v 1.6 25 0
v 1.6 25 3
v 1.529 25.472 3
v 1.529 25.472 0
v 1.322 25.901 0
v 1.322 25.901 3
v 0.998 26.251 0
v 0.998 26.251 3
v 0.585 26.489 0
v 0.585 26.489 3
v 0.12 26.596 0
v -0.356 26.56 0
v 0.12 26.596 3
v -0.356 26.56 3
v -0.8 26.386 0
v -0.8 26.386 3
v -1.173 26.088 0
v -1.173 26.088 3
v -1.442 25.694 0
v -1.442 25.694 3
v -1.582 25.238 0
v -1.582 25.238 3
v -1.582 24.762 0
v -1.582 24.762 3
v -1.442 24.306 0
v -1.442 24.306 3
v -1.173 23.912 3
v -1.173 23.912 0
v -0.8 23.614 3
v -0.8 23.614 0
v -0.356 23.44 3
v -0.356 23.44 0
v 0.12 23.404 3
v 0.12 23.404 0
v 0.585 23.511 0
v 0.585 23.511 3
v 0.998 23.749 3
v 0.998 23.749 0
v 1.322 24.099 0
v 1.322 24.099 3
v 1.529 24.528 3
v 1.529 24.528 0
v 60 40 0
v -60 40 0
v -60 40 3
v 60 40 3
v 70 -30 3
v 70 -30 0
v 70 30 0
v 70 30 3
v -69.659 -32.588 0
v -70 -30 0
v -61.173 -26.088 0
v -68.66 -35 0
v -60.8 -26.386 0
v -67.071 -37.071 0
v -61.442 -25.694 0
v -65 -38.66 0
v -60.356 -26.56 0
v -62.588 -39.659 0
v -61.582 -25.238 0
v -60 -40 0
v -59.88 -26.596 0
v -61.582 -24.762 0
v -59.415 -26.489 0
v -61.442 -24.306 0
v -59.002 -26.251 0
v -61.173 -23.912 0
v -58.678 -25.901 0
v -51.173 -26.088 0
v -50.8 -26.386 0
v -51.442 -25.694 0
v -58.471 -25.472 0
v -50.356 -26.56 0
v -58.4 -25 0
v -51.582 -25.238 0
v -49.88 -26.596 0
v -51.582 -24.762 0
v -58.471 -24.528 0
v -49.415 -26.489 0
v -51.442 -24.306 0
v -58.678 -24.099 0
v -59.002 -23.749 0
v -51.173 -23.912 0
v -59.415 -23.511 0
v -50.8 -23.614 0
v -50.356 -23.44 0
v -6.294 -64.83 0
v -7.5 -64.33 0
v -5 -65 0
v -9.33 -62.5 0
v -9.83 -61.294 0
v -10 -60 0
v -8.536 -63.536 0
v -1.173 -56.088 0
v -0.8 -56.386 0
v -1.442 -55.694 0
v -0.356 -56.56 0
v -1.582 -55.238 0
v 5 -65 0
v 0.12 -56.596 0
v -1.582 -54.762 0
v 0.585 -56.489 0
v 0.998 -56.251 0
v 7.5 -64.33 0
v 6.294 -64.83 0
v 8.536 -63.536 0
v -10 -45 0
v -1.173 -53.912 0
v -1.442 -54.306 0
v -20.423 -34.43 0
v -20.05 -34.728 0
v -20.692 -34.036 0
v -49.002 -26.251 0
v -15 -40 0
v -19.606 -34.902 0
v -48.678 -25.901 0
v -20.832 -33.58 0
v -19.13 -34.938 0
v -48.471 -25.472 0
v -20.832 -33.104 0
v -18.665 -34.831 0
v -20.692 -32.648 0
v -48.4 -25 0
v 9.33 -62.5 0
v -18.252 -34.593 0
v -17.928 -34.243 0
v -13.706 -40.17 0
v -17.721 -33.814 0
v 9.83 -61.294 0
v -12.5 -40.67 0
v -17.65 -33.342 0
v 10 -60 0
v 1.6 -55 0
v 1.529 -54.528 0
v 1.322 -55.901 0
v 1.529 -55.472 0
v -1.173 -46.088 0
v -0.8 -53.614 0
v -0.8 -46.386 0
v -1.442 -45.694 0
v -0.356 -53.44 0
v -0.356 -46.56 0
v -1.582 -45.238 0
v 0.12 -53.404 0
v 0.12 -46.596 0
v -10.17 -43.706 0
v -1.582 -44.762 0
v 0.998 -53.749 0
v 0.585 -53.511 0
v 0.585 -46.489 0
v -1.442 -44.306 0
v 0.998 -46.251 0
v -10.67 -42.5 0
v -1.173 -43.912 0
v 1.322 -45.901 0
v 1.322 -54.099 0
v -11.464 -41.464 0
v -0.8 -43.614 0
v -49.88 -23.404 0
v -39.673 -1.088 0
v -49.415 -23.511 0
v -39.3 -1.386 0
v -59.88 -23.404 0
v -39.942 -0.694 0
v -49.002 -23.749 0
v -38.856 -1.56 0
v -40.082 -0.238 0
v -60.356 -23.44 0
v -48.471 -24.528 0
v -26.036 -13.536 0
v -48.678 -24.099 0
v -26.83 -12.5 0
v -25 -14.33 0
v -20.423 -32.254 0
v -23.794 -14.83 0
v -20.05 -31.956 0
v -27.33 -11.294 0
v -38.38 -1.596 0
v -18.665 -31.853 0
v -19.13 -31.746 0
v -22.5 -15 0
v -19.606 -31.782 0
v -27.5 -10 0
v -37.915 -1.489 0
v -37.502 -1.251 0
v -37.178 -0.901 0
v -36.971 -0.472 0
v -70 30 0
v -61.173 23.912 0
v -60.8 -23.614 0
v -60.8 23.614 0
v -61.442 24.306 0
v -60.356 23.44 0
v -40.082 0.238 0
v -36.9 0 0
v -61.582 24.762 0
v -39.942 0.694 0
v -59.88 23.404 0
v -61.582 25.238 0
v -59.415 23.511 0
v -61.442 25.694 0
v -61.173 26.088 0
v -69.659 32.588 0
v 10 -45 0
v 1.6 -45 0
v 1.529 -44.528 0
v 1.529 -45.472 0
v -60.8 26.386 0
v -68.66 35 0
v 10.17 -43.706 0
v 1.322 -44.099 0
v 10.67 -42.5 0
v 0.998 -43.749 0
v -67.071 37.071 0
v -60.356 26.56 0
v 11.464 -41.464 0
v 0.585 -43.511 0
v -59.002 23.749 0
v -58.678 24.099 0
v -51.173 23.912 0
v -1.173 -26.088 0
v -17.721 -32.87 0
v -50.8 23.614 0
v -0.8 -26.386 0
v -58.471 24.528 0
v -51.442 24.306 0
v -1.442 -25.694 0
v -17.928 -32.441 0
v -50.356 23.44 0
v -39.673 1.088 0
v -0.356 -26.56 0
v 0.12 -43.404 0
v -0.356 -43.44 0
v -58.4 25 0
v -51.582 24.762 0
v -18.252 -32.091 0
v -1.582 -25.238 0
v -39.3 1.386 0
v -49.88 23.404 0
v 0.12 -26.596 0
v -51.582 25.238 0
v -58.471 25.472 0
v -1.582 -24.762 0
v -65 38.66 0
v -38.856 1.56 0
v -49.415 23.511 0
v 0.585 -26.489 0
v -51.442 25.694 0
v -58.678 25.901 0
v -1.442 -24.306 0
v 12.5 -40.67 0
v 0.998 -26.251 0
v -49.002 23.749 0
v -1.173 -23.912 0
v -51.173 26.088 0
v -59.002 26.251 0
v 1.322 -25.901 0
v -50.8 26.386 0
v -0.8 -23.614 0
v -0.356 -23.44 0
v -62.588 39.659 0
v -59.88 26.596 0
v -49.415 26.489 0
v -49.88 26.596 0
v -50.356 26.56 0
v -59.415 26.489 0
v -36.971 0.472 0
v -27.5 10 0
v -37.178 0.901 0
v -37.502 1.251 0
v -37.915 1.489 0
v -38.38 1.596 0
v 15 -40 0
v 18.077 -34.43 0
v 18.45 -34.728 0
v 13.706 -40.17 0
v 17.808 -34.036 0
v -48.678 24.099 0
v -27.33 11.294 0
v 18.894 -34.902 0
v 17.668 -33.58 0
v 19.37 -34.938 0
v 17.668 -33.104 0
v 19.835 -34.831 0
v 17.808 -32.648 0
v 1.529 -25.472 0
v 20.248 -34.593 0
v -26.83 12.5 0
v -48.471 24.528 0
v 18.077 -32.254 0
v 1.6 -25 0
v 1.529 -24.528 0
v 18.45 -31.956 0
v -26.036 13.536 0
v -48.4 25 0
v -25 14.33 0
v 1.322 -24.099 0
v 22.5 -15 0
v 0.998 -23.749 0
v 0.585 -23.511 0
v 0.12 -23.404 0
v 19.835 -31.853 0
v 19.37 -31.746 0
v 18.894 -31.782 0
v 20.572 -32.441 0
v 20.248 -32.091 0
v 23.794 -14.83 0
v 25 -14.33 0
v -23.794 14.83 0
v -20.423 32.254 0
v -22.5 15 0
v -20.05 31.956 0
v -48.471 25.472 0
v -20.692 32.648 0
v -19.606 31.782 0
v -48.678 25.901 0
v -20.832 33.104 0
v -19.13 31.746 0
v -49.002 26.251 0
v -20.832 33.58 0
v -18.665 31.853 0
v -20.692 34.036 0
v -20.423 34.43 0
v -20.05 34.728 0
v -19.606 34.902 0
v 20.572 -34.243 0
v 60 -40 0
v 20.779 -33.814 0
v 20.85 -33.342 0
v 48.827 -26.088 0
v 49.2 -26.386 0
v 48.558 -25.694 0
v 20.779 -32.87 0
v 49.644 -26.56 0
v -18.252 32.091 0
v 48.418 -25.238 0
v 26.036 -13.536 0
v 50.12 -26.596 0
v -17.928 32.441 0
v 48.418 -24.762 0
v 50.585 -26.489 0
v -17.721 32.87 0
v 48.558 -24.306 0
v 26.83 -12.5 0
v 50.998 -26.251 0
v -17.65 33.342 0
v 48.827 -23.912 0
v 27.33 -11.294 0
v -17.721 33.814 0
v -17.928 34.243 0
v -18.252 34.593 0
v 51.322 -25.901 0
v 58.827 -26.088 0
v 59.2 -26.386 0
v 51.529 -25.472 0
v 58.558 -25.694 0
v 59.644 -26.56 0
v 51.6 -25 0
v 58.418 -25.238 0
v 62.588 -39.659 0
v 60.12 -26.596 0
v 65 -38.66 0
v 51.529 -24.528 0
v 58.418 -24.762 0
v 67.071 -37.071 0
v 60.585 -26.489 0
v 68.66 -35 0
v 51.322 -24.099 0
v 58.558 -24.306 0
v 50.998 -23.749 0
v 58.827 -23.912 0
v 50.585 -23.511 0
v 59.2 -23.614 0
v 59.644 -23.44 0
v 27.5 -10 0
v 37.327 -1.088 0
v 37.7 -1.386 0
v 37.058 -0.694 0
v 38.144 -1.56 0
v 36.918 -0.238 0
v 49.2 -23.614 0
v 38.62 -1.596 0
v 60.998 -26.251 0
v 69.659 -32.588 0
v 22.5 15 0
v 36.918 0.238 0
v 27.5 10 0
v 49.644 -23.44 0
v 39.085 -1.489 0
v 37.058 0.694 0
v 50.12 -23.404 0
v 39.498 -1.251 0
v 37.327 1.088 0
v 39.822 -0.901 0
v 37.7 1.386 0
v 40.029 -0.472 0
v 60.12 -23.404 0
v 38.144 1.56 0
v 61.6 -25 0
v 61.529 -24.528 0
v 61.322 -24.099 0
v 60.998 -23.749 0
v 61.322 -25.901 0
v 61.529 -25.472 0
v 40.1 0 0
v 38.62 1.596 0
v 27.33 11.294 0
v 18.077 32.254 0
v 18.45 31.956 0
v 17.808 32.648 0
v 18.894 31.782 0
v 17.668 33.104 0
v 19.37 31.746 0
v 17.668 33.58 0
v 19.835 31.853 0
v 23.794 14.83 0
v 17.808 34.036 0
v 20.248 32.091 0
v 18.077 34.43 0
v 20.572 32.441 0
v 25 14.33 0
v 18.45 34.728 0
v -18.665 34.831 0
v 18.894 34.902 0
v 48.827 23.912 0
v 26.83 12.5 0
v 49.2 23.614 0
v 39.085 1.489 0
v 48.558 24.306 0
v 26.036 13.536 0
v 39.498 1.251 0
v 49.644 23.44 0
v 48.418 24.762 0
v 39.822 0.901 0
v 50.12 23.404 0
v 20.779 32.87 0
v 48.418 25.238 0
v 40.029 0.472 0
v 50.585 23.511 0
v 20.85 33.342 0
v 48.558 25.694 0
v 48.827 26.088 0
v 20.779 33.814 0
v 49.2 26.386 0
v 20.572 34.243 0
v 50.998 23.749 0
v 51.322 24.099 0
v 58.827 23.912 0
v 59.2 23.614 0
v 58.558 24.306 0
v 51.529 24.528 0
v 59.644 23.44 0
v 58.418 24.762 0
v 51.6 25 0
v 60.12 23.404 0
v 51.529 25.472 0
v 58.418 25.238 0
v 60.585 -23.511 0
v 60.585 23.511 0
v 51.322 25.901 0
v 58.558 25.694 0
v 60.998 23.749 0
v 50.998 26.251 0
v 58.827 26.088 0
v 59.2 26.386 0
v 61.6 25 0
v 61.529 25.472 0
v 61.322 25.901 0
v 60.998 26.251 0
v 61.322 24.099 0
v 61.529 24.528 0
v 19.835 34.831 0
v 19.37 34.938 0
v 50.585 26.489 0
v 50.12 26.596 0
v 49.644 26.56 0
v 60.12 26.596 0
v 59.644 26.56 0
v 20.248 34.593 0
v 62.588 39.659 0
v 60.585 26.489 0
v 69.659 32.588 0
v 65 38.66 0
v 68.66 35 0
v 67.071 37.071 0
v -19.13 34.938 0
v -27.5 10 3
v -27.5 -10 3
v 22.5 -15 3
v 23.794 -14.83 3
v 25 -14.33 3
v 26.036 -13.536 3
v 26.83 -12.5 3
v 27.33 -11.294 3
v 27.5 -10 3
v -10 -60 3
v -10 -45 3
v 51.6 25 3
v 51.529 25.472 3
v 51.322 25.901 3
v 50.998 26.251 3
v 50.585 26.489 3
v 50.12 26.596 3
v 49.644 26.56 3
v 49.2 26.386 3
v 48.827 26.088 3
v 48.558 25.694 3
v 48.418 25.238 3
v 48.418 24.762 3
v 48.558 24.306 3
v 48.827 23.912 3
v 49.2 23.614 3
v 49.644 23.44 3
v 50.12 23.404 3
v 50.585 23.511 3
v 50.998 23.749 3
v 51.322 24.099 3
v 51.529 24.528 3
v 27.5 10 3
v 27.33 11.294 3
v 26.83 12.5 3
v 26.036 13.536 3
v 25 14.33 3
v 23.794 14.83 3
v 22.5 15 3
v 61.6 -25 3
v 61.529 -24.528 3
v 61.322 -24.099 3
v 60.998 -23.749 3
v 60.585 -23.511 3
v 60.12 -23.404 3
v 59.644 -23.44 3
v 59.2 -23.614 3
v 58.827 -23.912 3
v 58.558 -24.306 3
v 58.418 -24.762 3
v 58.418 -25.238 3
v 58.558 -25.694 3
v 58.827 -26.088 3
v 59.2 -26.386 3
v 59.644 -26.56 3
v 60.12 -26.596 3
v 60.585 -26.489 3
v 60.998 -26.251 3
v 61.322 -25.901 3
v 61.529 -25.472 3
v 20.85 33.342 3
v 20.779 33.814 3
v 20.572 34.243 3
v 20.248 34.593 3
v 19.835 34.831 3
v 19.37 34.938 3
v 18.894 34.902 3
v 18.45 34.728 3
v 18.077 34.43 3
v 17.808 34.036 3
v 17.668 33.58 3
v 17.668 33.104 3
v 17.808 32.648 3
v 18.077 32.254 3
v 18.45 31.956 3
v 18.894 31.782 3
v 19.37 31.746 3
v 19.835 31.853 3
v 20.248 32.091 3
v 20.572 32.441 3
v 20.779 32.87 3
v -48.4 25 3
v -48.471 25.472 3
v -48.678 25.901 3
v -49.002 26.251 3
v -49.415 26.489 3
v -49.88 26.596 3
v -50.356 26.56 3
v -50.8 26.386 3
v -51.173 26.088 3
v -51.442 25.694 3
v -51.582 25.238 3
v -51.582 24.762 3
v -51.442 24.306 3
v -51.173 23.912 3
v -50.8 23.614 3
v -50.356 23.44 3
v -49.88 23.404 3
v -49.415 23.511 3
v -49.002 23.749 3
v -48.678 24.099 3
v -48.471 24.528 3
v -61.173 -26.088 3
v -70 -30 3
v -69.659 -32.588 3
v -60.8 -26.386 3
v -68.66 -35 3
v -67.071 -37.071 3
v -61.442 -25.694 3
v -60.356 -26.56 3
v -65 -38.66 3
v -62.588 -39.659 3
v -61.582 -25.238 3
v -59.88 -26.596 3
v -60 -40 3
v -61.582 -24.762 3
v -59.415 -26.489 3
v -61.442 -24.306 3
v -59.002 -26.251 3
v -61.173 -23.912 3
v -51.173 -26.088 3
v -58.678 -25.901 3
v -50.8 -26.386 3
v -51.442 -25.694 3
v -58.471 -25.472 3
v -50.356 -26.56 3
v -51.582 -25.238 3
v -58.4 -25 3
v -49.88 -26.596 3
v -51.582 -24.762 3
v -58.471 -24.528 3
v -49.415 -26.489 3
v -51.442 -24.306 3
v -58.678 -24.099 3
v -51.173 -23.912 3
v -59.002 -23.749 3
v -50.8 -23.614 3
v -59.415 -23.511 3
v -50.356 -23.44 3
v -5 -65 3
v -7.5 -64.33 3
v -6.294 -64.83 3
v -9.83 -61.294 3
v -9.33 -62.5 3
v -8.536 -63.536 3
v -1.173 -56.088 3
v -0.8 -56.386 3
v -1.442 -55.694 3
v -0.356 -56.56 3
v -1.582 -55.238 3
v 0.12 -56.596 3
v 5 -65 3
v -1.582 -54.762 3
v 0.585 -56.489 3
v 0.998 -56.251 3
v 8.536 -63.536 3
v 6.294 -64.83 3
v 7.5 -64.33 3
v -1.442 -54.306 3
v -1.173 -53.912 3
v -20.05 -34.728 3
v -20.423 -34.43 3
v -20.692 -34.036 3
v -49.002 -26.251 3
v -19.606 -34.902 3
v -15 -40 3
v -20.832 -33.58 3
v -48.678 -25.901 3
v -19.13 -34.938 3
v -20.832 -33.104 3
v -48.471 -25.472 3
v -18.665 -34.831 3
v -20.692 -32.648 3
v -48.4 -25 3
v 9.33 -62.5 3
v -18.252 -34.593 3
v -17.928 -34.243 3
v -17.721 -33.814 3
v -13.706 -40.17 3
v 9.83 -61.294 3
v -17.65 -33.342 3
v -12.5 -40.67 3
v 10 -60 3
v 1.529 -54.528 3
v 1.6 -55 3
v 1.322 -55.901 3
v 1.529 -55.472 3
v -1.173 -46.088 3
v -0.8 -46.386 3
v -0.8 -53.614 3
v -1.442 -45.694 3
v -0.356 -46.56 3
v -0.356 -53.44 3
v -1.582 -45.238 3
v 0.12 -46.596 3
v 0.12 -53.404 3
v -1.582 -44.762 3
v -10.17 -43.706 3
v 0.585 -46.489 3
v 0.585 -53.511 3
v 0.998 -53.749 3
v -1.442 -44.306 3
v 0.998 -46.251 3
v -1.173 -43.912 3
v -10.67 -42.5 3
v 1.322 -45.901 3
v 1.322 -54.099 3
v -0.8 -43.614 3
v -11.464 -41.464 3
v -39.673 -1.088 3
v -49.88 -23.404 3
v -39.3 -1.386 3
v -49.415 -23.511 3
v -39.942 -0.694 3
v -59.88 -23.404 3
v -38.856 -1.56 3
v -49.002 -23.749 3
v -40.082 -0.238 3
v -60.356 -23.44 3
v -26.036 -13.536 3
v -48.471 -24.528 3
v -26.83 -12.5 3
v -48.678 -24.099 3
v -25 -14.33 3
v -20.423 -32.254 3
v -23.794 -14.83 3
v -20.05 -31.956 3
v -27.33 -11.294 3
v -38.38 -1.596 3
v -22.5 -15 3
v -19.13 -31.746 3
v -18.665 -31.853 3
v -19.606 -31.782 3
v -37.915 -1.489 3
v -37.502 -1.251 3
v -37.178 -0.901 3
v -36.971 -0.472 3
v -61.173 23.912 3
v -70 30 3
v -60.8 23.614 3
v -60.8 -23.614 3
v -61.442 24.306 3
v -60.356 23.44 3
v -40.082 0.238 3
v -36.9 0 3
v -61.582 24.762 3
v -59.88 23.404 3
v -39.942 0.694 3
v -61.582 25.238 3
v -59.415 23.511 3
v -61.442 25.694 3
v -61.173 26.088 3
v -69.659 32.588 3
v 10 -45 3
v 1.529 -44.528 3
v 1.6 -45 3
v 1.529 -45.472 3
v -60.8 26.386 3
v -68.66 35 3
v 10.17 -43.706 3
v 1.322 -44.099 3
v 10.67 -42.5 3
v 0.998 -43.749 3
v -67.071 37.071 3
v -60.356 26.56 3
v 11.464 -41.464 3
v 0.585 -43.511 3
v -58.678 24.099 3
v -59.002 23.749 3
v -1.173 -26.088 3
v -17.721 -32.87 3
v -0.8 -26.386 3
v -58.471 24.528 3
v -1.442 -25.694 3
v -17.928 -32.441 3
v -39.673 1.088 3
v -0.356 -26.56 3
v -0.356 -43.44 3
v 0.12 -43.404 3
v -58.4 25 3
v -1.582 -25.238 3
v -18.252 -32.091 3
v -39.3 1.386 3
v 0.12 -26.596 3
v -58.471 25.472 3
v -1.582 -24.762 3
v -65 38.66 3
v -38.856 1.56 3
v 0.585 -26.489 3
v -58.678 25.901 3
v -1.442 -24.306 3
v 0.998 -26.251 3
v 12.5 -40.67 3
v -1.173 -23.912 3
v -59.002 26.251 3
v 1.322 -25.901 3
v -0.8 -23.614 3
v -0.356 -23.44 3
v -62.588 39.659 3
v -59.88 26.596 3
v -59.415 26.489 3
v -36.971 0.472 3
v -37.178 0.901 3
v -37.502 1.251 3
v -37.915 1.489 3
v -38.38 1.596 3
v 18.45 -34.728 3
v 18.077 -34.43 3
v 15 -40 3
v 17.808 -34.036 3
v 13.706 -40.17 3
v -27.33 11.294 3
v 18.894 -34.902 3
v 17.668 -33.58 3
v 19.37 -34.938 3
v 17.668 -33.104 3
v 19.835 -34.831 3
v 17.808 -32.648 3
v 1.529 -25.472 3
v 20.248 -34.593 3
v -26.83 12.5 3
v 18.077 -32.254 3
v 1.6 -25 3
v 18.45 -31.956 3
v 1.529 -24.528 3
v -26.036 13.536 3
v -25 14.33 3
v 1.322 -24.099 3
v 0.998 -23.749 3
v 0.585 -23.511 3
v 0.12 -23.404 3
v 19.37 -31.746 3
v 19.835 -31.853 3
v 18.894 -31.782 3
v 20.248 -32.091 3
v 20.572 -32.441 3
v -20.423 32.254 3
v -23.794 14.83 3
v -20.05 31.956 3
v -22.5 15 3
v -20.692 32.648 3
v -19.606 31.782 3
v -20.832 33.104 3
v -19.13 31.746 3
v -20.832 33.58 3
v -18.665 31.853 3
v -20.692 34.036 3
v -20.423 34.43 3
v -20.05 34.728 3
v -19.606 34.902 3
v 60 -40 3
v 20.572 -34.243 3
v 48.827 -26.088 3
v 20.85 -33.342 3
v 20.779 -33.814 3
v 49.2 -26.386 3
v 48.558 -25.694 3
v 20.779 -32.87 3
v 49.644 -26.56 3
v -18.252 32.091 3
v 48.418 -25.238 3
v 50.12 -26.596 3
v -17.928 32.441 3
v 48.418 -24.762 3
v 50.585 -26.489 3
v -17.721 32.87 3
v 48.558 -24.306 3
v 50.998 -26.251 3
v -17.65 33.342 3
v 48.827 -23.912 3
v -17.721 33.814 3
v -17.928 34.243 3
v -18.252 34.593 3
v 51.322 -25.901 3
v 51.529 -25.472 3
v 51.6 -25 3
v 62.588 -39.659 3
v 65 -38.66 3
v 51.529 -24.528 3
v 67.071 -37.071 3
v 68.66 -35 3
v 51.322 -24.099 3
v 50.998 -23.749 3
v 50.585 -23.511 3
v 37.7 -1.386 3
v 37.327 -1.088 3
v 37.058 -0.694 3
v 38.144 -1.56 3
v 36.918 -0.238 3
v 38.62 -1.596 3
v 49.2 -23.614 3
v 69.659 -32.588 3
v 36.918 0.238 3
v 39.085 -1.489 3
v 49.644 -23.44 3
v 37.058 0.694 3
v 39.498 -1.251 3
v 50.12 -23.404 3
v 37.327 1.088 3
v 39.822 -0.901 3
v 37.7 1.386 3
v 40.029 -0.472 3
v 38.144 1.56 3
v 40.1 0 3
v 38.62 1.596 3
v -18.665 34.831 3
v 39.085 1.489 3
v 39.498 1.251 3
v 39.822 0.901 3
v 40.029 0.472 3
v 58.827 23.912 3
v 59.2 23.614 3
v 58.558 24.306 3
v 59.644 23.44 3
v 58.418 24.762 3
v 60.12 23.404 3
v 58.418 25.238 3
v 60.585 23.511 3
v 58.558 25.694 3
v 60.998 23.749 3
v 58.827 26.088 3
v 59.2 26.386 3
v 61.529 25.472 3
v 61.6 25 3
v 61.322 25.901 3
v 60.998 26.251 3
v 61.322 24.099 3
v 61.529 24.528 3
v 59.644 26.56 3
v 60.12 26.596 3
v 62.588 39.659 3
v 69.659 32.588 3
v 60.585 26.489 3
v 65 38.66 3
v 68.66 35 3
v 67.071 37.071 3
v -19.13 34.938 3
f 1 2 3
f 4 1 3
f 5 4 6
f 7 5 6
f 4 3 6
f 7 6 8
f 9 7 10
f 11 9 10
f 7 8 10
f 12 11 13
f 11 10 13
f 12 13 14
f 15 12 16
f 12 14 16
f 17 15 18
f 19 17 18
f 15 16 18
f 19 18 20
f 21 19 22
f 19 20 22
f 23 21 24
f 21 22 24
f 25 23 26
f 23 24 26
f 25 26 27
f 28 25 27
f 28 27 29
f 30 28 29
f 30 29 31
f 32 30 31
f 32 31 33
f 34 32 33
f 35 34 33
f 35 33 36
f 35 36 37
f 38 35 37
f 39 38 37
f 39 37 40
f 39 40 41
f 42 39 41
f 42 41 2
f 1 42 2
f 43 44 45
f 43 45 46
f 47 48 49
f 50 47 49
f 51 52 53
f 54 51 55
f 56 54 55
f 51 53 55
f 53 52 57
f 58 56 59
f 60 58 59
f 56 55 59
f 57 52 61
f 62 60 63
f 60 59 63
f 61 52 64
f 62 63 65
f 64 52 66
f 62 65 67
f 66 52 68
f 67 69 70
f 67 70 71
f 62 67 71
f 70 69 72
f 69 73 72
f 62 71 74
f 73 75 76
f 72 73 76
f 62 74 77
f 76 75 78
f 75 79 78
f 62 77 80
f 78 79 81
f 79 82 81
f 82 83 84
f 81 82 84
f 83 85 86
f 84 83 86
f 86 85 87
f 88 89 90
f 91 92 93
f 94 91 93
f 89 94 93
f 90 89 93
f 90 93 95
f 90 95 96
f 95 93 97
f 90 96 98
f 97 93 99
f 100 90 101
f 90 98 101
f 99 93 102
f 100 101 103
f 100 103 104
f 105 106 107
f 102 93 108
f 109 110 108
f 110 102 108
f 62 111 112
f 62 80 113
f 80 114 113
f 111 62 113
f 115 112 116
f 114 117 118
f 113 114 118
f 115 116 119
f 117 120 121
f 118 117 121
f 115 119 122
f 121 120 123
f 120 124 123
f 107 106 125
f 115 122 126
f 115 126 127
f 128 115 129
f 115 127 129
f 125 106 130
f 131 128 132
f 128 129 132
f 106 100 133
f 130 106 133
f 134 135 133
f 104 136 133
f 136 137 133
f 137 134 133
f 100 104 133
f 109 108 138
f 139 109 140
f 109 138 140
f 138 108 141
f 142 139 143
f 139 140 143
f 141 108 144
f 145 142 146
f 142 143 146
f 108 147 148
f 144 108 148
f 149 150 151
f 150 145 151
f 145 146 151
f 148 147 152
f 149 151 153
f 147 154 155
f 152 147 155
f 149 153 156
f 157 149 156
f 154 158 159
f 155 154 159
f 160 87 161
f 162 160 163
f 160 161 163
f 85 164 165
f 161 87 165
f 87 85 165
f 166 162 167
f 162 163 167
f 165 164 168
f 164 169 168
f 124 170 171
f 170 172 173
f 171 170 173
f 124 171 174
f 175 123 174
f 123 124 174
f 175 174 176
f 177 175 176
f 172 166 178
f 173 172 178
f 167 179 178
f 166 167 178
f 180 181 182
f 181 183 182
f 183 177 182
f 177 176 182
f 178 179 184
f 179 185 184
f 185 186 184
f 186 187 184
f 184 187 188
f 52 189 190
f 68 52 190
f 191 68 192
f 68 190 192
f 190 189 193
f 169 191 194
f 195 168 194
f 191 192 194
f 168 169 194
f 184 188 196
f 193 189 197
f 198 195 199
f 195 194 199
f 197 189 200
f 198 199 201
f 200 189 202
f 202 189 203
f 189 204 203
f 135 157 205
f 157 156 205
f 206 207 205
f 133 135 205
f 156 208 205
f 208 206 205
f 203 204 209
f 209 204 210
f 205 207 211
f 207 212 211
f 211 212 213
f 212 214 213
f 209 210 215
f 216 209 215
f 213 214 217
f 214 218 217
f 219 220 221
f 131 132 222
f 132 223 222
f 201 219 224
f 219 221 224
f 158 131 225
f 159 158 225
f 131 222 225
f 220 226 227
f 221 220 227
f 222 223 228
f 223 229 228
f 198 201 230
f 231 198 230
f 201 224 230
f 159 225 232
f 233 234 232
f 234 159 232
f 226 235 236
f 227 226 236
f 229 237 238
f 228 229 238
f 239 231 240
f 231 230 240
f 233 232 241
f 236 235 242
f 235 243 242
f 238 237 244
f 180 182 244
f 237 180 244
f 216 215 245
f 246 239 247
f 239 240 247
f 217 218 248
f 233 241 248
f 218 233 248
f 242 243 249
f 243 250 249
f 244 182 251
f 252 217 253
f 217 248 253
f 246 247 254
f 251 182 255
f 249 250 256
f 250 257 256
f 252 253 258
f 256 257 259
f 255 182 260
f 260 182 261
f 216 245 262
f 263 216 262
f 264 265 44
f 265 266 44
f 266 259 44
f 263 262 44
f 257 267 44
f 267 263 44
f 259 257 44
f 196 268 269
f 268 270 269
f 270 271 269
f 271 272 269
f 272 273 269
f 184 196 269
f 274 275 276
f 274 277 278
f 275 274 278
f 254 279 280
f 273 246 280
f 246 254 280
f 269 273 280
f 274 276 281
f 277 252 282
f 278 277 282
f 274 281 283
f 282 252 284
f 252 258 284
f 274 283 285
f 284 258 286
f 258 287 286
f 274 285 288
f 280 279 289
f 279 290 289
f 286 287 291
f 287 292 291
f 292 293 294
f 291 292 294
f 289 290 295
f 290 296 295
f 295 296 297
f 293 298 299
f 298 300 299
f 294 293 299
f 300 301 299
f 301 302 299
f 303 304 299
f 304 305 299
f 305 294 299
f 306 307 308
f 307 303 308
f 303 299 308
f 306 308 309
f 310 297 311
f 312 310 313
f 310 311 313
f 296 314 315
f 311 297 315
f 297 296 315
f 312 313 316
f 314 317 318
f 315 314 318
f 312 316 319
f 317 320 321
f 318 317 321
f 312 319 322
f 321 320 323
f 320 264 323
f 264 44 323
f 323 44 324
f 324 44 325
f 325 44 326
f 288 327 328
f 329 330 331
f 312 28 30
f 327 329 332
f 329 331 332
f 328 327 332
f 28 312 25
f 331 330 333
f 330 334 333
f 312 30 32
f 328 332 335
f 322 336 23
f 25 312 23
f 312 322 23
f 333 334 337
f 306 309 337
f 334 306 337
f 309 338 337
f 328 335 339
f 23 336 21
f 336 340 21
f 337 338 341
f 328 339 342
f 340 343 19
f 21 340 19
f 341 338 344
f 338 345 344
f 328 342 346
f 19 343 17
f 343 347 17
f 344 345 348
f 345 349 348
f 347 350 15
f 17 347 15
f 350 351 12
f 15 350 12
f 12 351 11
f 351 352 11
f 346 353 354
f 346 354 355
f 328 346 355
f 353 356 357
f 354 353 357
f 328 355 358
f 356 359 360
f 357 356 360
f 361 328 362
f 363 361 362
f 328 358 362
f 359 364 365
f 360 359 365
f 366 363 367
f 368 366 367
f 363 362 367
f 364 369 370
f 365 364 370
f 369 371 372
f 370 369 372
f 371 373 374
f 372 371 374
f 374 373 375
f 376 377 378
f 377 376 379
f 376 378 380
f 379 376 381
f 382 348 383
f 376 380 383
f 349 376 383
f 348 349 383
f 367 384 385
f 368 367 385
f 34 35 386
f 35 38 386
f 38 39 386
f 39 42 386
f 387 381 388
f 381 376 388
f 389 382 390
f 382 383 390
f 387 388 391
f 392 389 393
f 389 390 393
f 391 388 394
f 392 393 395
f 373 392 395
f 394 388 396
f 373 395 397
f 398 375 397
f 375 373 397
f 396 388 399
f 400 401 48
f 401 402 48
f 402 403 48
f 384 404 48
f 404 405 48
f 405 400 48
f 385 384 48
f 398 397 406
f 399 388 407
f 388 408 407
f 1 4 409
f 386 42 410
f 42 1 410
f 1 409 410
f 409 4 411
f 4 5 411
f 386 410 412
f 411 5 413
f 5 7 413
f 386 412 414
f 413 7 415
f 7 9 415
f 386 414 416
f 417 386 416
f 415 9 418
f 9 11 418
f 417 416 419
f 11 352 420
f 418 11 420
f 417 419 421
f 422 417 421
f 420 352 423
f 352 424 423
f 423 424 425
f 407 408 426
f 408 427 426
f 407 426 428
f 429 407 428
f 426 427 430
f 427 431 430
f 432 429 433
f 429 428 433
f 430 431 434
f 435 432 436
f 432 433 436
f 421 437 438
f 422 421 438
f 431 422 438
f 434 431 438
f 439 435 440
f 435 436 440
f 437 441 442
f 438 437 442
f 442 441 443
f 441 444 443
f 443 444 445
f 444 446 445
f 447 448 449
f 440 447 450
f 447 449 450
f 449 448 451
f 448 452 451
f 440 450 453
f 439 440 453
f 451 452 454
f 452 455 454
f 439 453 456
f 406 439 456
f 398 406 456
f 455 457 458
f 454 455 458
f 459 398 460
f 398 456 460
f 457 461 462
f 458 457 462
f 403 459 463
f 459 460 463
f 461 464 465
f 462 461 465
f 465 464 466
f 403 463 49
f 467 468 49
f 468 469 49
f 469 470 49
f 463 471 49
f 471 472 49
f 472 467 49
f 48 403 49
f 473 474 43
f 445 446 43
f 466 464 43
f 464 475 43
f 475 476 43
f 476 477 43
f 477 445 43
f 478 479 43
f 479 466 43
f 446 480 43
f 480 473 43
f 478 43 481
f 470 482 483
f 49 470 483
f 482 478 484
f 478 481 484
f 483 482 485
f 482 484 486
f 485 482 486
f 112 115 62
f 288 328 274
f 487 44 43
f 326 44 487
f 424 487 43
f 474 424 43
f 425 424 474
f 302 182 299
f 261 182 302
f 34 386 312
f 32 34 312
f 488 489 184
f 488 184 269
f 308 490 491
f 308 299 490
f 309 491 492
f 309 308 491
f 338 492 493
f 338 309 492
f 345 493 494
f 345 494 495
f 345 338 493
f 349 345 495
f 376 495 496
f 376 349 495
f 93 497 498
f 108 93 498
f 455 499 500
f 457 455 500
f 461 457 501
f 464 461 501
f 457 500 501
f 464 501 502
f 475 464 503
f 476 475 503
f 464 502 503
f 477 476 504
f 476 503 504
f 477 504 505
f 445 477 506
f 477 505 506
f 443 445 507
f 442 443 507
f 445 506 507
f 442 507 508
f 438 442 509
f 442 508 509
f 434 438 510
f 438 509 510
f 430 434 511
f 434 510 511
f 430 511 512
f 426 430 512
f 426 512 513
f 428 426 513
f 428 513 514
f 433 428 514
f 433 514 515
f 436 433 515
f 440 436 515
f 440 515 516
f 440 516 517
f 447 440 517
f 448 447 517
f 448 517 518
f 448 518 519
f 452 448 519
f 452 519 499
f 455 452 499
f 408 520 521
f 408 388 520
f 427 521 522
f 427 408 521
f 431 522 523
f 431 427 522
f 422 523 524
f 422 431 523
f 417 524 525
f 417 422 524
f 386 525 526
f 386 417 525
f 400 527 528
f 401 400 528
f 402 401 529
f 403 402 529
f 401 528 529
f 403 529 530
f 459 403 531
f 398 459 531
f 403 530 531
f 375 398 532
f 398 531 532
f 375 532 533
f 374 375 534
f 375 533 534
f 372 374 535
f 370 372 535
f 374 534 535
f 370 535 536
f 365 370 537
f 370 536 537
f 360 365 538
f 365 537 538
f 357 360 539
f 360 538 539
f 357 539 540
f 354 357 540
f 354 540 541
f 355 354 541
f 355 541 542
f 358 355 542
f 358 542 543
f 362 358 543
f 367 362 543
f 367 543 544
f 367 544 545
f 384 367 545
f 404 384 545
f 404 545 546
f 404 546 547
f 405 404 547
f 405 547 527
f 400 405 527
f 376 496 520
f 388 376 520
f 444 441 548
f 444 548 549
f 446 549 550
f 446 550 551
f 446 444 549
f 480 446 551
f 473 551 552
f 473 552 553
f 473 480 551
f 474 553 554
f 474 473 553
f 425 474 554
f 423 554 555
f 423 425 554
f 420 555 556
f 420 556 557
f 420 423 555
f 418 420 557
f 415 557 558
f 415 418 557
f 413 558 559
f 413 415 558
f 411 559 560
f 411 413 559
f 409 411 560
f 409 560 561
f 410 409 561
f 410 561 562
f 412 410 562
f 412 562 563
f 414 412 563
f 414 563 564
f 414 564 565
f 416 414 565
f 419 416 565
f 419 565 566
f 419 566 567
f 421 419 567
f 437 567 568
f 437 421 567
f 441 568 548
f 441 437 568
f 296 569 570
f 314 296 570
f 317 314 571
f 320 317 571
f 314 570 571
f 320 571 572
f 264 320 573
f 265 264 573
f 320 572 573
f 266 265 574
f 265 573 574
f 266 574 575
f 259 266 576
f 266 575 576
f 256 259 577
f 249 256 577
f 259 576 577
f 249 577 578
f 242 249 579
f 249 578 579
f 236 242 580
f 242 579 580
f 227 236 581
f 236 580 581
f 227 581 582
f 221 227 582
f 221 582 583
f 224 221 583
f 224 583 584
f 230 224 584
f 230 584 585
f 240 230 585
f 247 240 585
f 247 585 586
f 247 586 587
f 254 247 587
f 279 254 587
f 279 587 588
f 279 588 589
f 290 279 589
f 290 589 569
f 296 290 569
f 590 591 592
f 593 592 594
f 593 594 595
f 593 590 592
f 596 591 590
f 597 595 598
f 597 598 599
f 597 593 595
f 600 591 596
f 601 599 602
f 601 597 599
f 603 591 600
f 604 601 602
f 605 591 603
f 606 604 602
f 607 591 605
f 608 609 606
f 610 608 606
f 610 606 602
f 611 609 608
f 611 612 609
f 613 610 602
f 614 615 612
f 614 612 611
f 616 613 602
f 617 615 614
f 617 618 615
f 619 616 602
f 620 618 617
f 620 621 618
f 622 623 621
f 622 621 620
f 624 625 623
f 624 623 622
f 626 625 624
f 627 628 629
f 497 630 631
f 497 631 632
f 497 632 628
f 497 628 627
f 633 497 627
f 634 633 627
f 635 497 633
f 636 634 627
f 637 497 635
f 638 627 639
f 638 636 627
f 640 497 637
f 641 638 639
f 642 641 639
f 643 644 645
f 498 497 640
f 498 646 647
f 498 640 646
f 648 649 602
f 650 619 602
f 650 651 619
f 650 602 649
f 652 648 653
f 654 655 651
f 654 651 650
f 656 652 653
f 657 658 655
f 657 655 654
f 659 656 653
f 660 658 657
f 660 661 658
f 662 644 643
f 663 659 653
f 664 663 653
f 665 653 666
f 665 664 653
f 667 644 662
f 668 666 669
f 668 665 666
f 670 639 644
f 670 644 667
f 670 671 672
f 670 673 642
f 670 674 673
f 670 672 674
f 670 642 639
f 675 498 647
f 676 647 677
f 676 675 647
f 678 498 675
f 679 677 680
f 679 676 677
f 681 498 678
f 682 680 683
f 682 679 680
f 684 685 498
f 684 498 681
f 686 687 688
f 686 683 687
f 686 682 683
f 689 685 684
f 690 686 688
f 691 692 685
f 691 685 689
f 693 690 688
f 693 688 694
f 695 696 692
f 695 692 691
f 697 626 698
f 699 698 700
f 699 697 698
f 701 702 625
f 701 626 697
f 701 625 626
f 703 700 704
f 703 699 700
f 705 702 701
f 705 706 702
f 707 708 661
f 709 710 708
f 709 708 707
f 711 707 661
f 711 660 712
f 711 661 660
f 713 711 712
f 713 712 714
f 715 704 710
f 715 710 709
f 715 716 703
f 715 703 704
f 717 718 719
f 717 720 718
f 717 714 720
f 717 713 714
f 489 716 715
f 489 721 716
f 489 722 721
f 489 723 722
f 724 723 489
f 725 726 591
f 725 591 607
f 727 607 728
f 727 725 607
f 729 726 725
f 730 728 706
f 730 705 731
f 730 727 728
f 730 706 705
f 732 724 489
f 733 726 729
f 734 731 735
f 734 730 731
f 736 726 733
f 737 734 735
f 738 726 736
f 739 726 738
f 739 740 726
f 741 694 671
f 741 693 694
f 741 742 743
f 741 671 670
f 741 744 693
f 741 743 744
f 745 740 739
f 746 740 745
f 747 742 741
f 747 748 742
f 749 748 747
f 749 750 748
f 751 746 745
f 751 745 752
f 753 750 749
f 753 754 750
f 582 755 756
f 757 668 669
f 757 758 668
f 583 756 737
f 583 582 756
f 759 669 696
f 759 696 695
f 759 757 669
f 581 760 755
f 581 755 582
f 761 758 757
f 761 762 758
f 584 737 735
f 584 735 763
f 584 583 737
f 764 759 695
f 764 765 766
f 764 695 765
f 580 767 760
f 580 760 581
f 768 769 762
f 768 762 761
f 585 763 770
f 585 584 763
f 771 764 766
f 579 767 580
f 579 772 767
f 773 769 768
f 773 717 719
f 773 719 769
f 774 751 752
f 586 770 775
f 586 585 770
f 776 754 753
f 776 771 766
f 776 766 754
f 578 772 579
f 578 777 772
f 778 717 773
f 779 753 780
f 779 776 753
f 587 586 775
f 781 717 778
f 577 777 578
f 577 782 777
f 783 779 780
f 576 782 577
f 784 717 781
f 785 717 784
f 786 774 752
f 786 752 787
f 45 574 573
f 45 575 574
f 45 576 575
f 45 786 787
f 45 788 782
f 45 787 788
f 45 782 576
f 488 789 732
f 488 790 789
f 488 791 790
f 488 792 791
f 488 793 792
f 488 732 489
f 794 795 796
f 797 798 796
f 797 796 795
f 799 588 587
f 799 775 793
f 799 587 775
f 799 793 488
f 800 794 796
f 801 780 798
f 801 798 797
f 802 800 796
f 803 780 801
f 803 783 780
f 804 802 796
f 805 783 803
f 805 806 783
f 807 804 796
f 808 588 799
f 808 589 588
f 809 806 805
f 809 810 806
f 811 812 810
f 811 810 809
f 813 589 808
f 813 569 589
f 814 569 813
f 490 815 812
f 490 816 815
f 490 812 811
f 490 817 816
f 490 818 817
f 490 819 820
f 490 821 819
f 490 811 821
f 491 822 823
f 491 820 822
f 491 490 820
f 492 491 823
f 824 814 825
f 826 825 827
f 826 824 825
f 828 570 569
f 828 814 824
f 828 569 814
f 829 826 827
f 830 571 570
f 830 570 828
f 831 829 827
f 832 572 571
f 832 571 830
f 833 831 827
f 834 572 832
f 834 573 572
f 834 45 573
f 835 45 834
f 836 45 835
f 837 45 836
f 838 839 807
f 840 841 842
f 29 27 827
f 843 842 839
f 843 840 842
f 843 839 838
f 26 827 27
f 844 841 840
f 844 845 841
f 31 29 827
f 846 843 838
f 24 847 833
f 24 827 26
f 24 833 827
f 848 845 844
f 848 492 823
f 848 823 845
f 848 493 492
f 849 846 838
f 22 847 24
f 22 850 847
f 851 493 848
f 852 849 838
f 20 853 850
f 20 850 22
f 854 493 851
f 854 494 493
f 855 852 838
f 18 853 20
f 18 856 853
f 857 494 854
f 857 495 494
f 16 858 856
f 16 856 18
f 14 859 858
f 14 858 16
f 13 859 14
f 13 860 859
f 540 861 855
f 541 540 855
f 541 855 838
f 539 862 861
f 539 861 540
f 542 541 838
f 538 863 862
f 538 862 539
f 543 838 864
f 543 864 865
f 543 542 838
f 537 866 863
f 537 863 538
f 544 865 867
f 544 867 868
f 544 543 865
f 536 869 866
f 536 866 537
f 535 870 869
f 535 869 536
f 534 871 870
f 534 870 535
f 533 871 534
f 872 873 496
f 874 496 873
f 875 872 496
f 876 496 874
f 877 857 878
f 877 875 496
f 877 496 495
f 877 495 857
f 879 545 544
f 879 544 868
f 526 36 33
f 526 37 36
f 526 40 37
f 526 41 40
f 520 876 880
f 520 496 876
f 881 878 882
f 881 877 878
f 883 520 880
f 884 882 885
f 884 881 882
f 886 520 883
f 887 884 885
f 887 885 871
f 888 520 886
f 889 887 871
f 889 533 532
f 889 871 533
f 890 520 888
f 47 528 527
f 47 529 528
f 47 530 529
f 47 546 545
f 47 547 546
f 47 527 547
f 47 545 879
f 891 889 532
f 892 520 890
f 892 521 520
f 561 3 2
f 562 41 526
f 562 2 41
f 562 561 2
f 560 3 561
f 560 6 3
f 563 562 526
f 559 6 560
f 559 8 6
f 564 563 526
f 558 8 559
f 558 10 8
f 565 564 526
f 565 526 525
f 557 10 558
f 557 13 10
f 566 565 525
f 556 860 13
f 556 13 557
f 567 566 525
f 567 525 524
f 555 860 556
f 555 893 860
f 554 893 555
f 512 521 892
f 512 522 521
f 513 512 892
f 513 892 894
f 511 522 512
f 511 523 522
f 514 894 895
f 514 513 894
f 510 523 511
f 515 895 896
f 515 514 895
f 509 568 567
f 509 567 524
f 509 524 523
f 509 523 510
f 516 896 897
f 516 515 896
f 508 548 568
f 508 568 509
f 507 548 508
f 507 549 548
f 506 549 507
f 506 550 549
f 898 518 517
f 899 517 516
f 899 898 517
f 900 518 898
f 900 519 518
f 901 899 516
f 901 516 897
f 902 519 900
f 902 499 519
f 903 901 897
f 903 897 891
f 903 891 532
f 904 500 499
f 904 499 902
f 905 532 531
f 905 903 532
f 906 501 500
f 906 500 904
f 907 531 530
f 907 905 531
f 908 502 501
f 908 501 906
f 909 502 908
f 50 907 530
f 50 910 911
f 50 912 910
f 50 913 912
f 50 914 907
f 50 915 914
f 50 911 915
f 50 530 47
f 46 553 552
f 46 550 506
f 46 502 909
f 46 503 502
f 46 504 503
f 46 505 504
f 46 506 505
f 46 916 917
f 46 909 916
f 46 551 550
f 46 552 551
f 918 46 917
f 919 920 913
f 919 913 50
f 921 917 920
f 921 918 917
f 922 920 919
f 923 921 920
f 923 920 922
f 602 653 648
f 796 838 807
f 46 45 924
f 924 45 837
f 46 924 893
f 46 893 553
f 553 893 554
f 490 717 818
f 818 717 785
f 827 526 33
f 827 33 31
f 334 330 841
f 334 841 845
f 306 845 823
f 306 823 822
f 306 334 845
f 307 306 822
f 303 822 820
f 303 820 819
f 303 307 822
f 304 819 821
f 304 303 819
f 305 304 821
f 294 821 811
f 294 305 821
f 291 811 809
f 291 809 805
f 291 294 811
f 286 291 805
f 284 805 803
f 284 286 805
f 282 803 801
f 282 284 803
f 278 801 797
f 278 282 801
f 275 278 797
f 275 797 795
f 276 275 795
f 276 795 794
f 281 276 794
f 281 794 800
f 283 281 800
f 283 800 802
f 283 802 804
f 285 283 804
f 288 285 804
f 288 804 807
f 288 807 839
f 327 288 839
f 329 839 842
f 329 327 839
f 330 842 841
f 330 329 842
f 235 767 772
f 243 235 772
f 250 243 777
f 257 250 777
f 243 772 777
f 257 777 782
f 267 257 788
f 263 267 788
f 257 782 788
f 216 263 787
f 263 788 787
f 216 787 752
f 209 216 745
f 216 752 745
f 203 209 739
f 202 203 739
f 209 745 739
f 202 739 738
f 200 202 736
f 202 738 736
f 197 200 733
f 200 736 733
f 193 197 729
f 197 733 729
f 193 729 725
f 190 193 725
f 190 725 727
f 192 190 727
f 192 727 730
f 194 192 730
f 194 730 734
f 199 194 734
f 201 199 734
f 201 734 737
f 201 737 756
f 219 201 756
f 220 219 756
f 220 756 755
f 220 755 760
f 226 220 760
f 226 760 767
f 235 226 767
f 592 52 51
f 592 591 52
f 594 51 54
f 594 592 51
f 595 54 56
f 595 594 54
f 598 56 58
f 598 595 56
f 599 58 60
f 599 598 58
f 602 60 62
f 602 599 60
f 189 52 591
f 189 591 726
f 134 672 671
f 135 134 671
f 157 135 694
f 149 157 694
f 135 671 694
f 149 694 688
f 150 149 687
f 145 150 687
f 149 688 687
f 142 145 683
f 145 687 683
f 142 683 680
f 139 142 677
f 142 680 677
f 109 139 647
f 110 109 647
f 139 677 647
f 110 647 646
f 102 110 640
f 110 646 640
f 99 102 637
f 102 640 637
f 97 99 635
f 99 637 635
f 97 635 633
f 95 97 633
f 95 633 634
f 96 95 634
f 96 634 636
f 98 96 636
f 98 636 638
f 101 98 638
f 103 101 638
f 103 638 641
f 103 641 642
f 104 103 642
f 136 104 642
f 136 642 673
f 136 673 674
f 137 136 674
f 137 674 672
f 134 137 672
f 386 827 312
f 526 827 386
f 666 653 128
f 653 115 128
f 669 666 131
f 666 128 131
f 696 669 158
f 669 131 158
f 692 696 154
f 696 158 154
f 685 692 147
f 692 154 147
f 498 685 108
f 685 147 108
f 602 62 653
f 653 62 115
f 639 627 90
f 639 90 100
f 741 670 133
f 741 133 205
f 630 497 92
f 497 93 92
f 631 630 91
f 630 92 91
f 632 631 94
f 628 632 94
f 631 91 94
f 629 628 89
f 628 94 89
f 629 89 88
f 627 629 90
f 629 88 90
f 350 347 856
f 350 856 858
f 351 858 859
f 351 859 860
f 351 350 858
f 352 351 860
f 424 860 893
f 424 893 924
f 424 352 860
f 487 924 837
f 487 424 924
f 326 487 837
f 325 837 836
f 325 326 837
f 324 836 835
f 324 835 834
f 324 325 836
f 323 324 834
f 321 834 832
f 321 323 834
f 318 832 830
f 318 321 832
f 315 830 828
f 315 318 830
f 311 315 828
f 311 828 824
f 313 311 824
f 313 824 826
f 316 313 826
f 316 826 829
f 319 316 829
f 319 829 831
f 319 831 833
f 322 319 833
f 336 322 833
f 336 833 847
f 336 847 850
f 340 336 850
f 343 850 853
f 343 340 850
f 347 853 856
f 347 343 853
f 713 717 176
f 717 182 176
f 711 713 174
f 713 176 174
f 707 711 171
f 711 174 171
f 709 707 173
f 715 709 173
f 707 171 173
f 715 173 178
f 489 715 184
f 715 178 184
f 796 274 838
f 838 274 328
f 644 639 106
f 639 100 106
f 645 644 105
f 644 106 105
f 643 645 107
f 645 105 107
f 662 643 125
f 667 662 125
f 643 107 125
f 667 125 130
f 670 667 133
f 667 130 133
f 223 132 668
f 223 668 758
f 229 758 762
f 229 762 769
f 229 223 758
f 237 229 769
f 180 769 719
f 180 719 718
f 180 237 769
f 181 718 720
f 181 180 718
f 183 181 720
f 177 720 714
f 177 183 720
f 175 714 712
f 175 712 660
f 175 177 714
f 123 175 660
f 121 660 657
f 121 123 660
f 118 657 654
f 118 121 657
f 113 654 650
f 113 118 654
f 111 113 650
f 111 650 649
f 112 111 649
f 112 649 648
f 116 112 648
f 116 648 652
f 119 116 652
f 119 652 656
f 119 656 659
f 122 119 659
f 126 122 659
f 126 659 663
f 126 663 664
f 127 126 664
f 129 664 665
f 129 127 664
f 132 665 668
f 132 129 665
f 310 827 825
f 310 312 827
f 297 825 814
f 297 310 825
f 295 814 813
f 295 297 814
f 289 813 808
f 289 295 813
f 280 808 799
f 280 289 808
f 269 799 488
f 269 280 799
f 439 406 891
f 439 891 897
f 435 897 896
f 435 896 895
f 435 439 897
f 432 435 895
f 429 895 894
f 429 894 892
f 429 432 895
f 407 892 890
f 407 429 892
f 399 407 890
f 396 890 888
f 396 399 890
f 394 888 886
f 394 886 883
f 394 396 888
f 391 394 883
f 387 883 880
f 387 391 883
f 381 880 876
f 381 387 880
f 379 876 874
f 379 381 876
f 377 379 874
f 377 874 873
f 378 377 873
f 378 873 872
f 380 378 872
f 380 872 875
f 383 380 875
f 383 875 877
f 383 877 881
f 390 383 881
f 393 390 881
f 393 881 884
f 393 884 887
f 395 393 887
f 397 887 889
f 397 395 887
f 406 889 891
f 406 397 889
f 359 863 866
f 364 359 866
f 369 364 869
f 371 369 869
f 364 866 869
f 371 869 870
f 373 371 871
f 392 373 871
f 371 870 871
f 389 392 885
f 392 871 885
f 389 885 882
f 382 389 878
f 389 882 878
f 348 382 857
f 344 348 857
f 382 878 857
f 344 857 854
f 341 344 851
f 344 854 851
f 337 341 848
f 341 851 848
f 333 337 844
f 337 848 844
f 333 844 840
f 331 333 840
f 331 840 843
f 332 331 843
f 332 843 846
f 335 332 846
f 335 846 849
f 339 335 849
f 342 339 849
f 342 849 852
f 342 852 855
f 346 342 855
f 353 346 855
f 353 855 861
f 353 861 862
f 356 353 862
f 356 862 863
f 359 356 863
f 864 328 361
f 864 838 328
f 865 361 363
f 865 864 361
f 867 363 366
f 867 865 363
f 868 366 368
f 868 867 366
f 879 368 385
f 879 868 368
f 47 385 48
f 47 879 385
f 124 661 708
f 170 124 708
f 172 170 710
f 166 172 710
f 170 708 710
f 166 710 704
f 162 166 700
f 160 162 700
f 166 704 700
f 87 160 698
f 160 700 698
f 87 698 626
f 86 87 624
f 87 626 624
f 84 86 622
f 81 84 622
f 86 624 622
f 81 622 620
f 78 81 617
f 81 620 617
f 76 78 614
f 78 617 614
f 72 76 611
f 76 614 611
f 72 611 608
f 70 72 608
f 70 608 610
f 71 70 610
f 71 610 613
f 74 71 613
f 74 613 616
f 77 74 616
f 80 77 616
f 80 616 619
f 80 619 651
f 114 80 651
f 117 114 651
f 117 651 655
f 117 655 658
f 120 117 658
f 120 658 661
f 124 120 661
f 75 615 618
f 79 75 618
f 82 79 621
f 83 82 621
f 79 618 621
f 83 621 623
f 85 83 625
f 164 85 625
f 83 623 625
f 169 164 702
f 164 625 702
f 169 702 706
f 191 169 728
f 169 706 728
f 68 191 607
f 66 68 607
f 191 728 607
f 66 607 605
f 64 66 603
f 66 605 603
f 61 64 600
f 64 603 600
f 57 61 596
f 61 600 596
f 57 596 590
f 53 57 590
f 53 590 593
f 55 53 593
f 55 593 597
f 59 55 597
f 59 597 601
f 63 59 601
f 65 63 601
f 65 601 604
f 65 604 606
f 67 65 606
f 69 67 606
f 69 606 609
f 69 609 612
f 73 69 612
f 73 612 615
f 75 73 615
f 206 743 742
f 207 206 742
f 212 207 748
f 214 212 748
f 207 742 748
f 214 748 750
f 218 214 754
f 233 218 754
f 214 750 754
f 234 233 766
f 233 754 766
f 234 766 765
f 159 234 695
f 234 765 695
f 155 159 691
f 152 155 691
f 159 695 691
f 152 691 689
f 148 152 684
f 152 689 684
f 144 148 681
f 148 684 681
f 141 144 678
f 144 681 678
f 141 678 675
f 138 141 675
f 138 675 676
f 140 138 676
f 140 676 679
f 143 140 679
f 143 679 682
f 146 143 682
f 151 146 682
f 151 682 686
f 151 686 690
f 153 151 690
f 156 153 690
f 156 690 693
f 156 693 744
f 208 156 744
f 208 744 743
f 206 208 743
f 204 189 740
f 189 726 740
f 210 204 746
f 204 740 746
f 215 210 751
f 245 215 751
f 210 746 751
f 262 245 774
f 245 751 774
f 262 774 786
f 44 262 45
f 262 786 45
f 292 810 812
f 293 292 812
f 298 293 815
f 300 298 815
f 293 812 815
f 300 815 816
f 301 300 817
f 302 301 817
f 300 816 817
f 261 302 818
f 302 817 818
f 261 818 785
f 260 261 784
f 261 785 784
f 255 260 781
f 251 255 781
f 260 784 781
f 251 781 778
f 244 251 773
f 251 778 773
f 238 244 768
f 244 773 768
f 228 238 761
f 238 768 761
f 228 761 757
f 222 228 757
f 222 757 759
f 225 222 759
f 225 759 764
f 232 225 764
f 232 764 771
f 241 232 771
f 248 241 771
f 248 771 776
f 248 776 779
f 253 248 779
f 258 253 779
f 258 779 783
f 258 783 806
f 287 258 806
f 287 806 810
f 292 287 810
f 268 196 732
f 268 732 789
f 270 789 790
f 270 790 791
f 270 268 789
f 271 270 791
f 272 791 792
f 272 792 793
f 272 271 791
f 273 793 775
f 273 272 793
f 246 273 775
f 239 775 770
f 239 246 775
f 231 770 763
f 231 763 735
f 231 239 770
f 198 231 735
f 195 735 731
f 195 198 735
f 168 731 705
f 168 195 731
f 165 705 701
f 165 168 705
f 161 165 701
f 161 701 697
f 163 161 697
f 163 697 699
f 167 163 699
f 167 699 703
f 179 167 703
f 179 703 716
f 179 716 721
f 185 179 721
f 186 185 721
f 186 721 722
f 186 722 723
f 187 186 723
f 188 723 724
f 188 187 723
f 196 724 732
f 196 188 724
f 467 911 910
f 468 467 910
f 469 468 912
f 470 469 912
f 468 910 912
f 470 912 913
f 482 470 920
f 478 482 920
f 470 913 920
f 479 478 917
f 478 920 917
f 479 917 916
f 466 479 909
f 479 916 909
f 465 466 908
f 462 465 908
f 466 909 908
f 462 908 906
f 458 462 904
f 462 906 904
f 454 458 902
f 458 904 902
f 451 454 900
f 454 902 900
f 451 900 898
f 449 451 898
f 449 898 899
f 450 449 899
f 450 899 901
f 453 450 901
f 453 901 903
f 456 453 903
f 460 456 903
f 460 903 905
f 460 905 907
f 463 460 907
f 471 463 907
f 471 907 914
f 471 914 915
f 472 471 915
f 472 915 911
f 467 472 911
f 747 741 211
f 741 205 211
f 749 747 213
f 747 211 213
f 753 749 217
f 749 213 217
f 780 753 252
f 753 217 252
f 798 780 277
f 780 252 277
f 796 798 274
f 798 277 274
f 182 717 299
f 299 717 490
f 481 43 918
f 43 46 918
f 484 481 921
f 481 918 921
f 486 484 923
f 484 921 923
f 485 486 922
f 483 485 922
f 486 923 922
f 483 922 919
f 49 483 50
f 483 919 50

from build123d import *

# Parameters (mm, degrees)
SKETCH_1_W          = 140
SKETCH_1_H          = 80
SKETCH_1_R          = 1.6
EXTRUDE_1_DEPTH     = 3
SKETCH_2_R          = 1.6
CUT_EXTRUDE_1_DEPTH = 10
SKETCH_3_W          = 55
SKETCH_3_H          = 30
CUT_EXTRUDE_2_DEPTH = 10
FILLET_1_R          = 5
FILLET_2_R          = 10
SKETCH_4_R          = 1.6
CUT_EXTRUDE_3_DEPTH = 10
SKETCH_6_W          = 20
SKETCH_6_H          = 25
EXTRUDE_2_DEPTH     = 3
SKETCH_7_R          = 1.6
CUT_EXTRUDE_5_DEPTH = 4
FILLET_3_R          = 5


with BuildPart() as part:
    # 草图1 → 凸台-拉伸1 (new body)
    with BuildSketch(Plane.XY):
        Rectangle(SKETCH_1_W, SKETCH_1_H)
        with Locations((19.25, 33.341978046)):
            Circle(SKETCH_1_R, mode=Mode.SUBTRACT)
        with Locations((38.5, 0)):
            Circle(SKETCH_1_R, mode=Mode.SUBTRACT)
        with Locations((19.25, -33.341978046)):
            Circle(SKETCH_1_R, mode=Mode.SUBTRACT)
        with Locations((-19.25, -33.341978046)):
            Circle(SKETCH_1_R, mode=Mode.SUBTRACT)
        with Locations((-38.5, 0)):
            Circle(SKETCH_1_R, mode=Mode.SUBTRACT)
        with Locations((-19.25, 33.341978046)):
            Circle(SKETCH_1_R, mode=Mode.SUBTRACT)
    extrude(amount=EXTRUDE_1_DEPTH)

    # 草图2 → 切除-拉伸1 (cut)
    with BuildSketch(Plane.XY.offset(3)):
        with Locations((0, 25)):
            Circle(SKETCH_2_R)
        with Locations((-60, 25)):
            Circle(SKETCH_2_R)
        with Locations((60, 25)):
            Circle(SKETCH_2_R)
        with Locations((60, -25)):
            Circle(SKETCH_2_R)
        with Locations((-60, -25)):
            Circle(SKETCH_2_R)
        with Locations((0, -25)):
            Circle(SKETCH_2_R)
    extrude(amount=-CUT_EXTRUDE_1_DEPTH, mode=Mode.SUBTRACT)

    # 草图3 → 切除-拉伸2 (cut)
    with BuildSketch(Plane.XY.offset(3)):
        Rectangle(SKETCH_3_W, SKETCH_3_H)
    extrude(amount=-CUT_EXTRUDE_2_DEPTH, mode=Mode.SUBTRACT)

    # 圆角1
    fillet_1_edges = [part.edges().sort_by_distance(p)[0] for p in [
        (27.5, 15, 1.5),
        (27.5, -15, 1.5),
        (-27.5, -15, 1.5),
        (-27.5, 15, 1.5),
    ]]
    fillet(fillet_1_edges, radius=FILLET_1_R)

    # 圆角2
    fillet_2_edges = [part.edges().sort_by_distance(p)[0] for p in [
        (70, -40, 1.5),
        (-70, -40, 1.5),
        (-70, 40, 1.5),
        (70, 40, 1.5),
    ]]
    fillet(fillet_2_edges, radius=FILLET_2_R)

    # 草图4 → 切除-拉伸3 (cut)
    with BuildSketch(Plane.XY.offset(3)):
        with Locations((-50, 25)):
            Circle(SKETCH_4_R)
        with Locations((-50, -25)):
            Circle(SKETCH_4_R)
        with Locations((50, -25)):
            Circle(SKETCH_4_R)
        with Locations((50, 25)):
            Circle(SKETCH_4_R)
    extrude(amount=-CUT_EXTRUDE_3_DEPTH, mode=Mode.SUBTRACT)

    # 草图6 → 凸台-拉伸2 (add)
    with BuildSketch(Plane.XY.offset(3)):
        with Locations((0, -52.5)):
            Rectangle(SKETCH_6_W, SKETCH_6_H)
    extrude(amount=-EXTRUDE_2_DEPTH)

    # 草图7 → 切除-拉伸5 (cut, through all)
    with BuildSketch(Plane.XY.offset(3)):
        with Locations((0, -45)):
            Circle(SKETCH_7_R)
        with Locations((0, -55)):
            Circle(SKETCH_7_R)
    extrude(amount=-CUT_EXTRUDE_5_DEPTH, mode=Mode.SUBTRACT)

    # 圆角3
    fillet_3_edges = [part.edges().sort_by_distance(p)[0] for p in [
        (-10, -40, 1.5),
        (10, -40, 1.5),
        (10, -65, 1.5),
        (-10, -65, 1.5),
    ]]
    fillet(fillet_3_edges, radius=FILLET_3_R)


solid = part.part
